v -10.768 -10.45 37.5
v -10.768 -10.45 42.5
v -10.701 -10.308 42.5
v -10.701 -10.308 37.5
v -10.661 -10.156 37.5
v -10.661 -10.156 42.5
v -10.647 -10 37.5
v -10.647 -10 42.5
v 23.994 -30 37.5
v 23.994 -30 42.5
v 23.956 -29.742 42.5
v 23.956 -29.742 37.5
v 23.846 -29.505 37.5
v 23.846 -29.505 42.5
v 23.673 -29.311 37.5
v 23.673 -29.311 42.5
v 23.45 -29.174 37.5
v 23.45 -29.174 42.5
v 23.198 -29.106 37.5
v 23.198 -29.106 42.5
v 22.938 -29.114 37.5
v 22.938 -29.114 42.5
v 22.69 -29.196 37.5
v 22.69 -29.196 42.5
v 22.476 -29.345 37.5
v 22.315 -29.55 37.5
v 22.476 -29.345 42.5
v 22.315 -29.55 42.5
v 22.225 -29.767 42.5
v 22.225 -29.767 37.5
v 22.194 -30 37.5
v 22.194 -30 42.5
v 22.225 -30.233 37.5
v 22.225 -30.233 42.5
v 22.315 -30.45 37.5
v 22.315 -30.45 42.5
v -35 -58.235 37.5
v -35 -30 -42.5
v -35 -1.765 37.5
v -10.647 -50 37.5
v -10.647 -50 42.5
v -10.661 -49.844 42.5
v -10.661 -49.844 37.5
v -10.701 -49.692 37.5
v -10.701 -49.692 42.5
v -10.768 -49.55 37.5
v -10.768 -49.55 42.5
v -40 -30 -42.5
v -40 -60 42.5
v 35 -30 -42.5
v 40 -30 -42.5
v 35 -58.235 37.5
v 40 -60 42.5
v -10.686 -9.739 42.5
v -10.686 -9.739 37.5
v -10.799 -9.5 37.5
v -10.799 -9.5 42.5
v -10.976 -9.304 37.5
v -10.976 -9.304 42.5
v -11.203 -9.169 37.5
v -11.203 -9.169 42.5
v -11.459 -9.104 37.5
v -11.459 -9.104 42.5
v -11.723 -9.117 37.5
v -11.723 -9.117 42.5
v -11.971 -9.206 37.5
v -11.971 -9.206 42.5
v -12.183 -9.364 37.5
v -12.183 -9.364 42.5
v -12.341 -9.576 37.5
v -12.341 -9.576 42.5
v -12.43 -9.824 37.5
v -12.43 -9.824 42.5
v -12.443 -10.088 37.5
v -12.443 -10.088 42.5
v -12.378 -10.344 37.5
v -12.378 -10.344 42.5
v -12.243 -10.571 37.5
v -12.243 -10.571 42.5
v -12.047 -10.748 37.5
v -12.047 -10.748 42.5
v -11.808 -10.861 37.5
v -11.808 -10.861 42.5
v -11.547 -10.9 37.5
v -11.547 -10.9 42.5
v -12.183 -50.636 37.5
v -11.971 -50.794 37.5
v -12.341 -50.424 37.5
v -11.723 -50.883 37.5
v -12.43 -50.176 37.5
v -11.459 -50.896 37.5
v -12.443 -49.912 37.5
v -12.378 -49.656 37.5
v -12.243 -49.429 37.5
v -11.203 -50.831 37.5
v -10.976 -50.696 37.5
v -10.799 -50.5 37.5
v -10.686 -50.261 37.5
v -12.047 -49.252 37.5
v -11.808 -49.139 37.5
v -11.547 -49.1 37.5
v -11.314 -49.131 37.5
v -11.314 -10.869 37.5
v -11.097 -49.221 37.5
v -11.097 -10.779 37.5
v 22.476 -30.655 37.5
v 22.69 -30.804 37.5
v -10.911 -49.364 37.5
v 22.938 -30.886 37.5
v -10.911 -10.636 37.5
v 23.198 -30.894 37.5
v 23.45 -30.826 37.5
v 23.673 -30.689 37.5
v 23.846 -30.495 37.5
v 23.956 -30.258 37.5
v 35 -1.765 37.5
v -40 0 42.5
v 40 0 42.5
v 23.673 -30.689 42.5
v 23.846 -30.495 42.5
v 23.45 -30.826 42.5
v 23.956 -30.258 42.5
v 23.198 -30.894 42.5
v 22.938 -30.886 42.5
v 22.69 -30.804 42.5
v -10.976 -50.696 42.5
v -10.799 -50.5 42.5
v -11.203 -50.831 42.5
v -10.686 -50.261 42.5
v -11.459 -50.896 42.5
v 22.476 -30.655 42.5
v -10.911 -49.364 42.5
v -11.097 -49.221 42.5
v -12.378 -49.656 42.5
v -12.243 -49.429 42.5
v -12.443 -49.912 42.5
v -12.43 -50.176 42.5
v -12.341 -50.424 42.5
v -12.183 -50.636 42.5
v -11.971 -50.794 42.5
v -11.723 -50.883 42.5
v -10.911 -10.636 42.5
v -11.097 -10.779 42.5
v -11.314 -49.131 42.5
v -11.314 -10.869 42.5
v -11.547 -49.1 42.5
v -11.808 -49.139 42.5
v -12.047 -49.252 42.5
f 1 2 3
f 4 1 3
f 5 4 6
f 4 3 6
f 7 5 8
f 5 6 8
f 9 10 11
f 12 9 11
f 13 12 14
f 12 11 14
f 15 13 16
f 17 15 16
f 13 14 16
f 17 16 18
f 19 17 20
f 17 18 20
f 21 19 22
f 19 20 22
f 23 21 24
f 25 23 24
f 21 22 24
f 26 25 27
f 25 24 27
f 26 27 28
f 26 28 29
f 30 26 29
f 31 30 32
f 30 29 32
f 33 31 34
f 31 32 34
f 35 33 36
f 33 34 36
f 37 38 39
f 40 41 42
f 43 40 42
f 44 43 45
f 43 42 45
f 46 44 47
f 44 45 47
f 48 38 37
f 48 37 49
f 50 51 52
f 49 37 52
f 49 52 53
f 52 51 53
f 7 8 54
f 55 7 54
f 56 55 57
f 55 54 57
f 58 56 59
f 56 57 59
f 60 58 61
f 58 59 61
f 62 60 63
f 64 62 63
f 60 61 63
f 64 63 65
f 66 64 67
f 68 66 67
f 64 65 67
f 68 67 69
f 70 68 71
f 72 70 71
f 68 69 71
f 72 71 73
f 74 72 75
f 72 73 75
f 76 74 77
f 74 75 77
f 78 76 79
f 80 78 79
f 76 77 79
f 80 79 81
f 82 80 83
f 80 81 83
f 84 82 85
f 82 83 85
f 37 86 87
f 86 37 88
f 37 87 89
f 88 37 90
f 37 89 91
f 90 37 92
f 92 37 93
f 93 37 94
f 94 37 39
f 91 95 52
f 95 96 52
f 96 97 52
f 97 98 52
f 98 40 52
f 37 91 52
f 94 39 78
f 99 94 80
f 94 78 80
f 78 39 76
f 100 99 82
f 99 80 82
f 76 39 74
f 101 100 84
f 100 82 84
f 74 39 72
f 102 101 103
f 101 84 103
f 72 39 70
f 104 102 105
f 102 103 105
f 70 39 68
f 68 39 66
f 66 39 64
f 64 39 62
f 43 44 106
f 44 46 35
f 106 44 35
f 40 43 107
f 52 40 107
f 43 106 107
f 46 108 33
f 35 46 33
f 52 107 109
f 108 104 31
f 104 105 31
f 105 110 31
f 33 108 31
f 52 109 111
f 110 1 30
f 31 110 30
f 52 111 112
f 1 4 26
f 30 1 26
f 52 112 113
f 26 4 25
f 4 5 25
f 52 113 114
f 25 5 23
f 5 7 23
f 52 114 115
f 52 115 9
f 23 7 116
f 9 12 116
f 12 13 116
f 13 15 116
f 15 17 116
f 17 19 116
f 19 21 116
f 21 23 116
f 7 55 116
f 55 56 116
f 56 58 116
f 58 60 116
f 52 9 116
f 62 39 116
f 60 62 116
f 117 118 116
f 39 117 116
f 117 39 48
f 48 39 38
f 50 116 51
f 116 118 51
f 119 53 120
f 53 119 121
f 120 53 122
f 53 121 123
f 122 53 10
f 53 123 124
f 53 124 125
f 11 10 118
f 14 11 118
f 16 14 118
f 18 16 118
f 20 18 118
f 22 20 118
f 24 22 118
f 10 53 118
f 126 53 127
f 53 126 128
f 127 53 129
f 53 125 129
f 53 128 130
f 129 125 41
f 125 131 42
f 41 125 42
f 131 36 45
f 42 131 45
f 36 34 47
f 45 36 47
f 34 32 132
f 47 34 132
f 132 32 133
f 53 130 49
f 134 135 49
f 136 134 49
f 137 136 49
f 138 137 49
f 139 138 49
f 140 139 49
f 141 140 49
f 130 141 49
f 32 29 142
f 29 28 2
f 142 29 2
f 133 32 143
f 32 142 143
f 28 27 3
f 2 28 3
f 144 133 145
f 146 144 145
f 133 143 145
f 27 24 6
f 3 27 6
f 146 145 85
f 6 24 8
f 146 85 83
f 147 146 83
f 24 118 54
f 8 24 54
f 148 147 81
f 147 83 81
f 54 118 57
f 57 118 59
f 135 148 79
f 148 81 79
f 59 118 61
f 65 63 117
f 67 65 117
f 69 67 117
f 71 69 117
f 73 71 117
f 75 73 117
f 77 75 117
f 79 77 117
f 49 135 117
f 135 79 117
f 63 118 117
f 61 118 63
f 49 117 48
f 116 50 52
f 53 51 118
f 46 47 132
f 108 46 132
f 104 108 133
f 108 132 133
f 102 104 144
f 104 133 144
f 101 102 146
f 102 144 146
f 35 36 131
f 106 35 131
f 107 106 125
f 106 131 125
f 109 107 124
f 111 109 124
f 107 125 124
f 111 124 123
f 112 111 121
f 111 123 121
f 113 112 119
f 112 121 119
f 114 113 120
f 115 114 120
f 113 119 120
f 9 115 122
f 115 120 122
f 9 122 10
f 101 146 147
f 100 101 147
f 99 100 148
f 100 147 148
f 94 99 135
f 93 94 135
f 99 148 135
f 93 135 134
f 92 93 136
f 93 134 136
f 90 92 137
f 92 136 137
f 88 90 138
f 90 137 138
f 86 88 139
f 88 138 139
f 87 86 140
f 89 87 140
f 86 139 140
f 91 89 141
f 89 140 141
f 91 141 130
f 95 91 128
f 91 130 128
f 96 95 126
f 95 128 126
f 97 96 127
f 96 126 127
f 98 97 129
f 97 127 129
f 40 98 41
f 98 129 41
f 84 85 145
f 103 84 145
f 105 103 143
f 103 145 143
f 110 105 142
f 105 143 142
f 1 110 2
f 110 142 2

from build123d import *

# Parameters (mm, degrees)
F0_W     = 5
F0_H     = 80
F0_H_2   = 5
F0_W_2   = 70
F1_DEPTH = 60
F3_DEPTH = 85.001
F5_DEPTH = 80.001


with BuildPart() as f1:
    # F0 (on Front) → F1 (new body)
    with BuildSketch(Plane.XZ):
        with Locations((-37.5, -2.5)):
            Rectangle(F0_W, F0_H)
        with Locations((-37.5, 40)):
            Rectangle(F0_W, F0_H_2)
        with Locations((0, 40)):
            Rectangle(F0_W_2, F0_H_2)
        with Locations((37.5, 40)):
            Rectangle(F0_W, F0_H_2)
        with Locations((37.5, -2.5)):
            Rectangle(F0_W, F0_H)
    extrude(amount=F1_DEPTH)

    # F2 (on face) → F3 (cut, through all)
    with BuildSketch(Plane.XY.offset(42.5)):
        with BuildLine():
            Line((22.3145879042, -29.55), (23.0940107676, -30))
            Line((23.0940107676, -30), (22.3145879042, -30.45))
            ThreePointArc((22.3145879042, -30.45), (23.3269479082, -30.8693332437), (23.9940107676, -30))
            ThreePointArc((23.9940107676, -30), (23.3269479082, -29.1306667563), (22.3145879042, -29.55))
        make_face()
        with BuildLine():
            Line((22.3145879042, -30.45), (23.0940107676, -30))
            Line((23.0940107676, -30), (22.3145879042, -29.55))
            ThreePointArc((22.3145879042, -29.55), (22.1940107676, -30), (22.3145879042, -30.45))
        make_face()
        with BuildLine():
            ThreePointArc((-11.5470053838, -10.9), (-11.0970053838, -10.7794228634), (-10.7675825204, -10.45))
            Line((-10.7675825204, -10.45), (-11.5470053838, -10))
            Line((-11.5470053838, -10), (-11.5470053838, -10.9))
        make_face()
        with BuildLine():
            Line((-11.5470053838, -10), (-10.7675825204, -10.45))
            ThreePointArc((-10.7675825204, -10.45), (-10.6776721401, -10.2329371406), (-10.6470053838, -10))
            ThreePointArc((-10.6470053838, -10), (-12.1834014869, -9.3636038969), (-11.5470053838, -10.9))
            Line((-11.5470053838, -10.9), (-11.5470053838, -10))
        make_face()
        with BuildLine():
            Line((-11.5470053838, -50), (-10.7675825204, -49.55))
            ThreePointArc((-10.7675825204, -49.55), (-11.0970053838, -49.2205771366), (-11.5470053838, -49.1))
            Line((-11.5470053838, -49.1), (-11.5470053838, -50))
        make_face()
        with BuildLine():
            ThreePointArc((-10.6470053838, -50), (-10.6776721401, -49.7670628594), (-10.7675825204, -49.55))
            Line((-10.7675825204, -49.55), (-11.5470053838, -50))
            Line((-11.5470053838, -50), (-11.5470053838, -49.1))
            ThreePointArc((-11.5470053838, -49.1), (-12.1834014869, -50.6363961031), (-10.6470053838, -50))
        make_face()
    extrude(amount=-F3_DEPTH, mode=Mode.SUBTRACT)

    # F4 (on face) → F5 (cut, through all)
    with BuildSketch(Plane.YZ.offset(40)):
        Polygon((-60, -42.5), (-30, -42.5), (-60, 42.5), align=None)
        Polygon((0, 42.5), (-30, -42.5), (0, -42.5), align=None)
    extrude(amount=-F5_DEPTH, mode=Mode.SUBTRACT)


solid = f1.part
